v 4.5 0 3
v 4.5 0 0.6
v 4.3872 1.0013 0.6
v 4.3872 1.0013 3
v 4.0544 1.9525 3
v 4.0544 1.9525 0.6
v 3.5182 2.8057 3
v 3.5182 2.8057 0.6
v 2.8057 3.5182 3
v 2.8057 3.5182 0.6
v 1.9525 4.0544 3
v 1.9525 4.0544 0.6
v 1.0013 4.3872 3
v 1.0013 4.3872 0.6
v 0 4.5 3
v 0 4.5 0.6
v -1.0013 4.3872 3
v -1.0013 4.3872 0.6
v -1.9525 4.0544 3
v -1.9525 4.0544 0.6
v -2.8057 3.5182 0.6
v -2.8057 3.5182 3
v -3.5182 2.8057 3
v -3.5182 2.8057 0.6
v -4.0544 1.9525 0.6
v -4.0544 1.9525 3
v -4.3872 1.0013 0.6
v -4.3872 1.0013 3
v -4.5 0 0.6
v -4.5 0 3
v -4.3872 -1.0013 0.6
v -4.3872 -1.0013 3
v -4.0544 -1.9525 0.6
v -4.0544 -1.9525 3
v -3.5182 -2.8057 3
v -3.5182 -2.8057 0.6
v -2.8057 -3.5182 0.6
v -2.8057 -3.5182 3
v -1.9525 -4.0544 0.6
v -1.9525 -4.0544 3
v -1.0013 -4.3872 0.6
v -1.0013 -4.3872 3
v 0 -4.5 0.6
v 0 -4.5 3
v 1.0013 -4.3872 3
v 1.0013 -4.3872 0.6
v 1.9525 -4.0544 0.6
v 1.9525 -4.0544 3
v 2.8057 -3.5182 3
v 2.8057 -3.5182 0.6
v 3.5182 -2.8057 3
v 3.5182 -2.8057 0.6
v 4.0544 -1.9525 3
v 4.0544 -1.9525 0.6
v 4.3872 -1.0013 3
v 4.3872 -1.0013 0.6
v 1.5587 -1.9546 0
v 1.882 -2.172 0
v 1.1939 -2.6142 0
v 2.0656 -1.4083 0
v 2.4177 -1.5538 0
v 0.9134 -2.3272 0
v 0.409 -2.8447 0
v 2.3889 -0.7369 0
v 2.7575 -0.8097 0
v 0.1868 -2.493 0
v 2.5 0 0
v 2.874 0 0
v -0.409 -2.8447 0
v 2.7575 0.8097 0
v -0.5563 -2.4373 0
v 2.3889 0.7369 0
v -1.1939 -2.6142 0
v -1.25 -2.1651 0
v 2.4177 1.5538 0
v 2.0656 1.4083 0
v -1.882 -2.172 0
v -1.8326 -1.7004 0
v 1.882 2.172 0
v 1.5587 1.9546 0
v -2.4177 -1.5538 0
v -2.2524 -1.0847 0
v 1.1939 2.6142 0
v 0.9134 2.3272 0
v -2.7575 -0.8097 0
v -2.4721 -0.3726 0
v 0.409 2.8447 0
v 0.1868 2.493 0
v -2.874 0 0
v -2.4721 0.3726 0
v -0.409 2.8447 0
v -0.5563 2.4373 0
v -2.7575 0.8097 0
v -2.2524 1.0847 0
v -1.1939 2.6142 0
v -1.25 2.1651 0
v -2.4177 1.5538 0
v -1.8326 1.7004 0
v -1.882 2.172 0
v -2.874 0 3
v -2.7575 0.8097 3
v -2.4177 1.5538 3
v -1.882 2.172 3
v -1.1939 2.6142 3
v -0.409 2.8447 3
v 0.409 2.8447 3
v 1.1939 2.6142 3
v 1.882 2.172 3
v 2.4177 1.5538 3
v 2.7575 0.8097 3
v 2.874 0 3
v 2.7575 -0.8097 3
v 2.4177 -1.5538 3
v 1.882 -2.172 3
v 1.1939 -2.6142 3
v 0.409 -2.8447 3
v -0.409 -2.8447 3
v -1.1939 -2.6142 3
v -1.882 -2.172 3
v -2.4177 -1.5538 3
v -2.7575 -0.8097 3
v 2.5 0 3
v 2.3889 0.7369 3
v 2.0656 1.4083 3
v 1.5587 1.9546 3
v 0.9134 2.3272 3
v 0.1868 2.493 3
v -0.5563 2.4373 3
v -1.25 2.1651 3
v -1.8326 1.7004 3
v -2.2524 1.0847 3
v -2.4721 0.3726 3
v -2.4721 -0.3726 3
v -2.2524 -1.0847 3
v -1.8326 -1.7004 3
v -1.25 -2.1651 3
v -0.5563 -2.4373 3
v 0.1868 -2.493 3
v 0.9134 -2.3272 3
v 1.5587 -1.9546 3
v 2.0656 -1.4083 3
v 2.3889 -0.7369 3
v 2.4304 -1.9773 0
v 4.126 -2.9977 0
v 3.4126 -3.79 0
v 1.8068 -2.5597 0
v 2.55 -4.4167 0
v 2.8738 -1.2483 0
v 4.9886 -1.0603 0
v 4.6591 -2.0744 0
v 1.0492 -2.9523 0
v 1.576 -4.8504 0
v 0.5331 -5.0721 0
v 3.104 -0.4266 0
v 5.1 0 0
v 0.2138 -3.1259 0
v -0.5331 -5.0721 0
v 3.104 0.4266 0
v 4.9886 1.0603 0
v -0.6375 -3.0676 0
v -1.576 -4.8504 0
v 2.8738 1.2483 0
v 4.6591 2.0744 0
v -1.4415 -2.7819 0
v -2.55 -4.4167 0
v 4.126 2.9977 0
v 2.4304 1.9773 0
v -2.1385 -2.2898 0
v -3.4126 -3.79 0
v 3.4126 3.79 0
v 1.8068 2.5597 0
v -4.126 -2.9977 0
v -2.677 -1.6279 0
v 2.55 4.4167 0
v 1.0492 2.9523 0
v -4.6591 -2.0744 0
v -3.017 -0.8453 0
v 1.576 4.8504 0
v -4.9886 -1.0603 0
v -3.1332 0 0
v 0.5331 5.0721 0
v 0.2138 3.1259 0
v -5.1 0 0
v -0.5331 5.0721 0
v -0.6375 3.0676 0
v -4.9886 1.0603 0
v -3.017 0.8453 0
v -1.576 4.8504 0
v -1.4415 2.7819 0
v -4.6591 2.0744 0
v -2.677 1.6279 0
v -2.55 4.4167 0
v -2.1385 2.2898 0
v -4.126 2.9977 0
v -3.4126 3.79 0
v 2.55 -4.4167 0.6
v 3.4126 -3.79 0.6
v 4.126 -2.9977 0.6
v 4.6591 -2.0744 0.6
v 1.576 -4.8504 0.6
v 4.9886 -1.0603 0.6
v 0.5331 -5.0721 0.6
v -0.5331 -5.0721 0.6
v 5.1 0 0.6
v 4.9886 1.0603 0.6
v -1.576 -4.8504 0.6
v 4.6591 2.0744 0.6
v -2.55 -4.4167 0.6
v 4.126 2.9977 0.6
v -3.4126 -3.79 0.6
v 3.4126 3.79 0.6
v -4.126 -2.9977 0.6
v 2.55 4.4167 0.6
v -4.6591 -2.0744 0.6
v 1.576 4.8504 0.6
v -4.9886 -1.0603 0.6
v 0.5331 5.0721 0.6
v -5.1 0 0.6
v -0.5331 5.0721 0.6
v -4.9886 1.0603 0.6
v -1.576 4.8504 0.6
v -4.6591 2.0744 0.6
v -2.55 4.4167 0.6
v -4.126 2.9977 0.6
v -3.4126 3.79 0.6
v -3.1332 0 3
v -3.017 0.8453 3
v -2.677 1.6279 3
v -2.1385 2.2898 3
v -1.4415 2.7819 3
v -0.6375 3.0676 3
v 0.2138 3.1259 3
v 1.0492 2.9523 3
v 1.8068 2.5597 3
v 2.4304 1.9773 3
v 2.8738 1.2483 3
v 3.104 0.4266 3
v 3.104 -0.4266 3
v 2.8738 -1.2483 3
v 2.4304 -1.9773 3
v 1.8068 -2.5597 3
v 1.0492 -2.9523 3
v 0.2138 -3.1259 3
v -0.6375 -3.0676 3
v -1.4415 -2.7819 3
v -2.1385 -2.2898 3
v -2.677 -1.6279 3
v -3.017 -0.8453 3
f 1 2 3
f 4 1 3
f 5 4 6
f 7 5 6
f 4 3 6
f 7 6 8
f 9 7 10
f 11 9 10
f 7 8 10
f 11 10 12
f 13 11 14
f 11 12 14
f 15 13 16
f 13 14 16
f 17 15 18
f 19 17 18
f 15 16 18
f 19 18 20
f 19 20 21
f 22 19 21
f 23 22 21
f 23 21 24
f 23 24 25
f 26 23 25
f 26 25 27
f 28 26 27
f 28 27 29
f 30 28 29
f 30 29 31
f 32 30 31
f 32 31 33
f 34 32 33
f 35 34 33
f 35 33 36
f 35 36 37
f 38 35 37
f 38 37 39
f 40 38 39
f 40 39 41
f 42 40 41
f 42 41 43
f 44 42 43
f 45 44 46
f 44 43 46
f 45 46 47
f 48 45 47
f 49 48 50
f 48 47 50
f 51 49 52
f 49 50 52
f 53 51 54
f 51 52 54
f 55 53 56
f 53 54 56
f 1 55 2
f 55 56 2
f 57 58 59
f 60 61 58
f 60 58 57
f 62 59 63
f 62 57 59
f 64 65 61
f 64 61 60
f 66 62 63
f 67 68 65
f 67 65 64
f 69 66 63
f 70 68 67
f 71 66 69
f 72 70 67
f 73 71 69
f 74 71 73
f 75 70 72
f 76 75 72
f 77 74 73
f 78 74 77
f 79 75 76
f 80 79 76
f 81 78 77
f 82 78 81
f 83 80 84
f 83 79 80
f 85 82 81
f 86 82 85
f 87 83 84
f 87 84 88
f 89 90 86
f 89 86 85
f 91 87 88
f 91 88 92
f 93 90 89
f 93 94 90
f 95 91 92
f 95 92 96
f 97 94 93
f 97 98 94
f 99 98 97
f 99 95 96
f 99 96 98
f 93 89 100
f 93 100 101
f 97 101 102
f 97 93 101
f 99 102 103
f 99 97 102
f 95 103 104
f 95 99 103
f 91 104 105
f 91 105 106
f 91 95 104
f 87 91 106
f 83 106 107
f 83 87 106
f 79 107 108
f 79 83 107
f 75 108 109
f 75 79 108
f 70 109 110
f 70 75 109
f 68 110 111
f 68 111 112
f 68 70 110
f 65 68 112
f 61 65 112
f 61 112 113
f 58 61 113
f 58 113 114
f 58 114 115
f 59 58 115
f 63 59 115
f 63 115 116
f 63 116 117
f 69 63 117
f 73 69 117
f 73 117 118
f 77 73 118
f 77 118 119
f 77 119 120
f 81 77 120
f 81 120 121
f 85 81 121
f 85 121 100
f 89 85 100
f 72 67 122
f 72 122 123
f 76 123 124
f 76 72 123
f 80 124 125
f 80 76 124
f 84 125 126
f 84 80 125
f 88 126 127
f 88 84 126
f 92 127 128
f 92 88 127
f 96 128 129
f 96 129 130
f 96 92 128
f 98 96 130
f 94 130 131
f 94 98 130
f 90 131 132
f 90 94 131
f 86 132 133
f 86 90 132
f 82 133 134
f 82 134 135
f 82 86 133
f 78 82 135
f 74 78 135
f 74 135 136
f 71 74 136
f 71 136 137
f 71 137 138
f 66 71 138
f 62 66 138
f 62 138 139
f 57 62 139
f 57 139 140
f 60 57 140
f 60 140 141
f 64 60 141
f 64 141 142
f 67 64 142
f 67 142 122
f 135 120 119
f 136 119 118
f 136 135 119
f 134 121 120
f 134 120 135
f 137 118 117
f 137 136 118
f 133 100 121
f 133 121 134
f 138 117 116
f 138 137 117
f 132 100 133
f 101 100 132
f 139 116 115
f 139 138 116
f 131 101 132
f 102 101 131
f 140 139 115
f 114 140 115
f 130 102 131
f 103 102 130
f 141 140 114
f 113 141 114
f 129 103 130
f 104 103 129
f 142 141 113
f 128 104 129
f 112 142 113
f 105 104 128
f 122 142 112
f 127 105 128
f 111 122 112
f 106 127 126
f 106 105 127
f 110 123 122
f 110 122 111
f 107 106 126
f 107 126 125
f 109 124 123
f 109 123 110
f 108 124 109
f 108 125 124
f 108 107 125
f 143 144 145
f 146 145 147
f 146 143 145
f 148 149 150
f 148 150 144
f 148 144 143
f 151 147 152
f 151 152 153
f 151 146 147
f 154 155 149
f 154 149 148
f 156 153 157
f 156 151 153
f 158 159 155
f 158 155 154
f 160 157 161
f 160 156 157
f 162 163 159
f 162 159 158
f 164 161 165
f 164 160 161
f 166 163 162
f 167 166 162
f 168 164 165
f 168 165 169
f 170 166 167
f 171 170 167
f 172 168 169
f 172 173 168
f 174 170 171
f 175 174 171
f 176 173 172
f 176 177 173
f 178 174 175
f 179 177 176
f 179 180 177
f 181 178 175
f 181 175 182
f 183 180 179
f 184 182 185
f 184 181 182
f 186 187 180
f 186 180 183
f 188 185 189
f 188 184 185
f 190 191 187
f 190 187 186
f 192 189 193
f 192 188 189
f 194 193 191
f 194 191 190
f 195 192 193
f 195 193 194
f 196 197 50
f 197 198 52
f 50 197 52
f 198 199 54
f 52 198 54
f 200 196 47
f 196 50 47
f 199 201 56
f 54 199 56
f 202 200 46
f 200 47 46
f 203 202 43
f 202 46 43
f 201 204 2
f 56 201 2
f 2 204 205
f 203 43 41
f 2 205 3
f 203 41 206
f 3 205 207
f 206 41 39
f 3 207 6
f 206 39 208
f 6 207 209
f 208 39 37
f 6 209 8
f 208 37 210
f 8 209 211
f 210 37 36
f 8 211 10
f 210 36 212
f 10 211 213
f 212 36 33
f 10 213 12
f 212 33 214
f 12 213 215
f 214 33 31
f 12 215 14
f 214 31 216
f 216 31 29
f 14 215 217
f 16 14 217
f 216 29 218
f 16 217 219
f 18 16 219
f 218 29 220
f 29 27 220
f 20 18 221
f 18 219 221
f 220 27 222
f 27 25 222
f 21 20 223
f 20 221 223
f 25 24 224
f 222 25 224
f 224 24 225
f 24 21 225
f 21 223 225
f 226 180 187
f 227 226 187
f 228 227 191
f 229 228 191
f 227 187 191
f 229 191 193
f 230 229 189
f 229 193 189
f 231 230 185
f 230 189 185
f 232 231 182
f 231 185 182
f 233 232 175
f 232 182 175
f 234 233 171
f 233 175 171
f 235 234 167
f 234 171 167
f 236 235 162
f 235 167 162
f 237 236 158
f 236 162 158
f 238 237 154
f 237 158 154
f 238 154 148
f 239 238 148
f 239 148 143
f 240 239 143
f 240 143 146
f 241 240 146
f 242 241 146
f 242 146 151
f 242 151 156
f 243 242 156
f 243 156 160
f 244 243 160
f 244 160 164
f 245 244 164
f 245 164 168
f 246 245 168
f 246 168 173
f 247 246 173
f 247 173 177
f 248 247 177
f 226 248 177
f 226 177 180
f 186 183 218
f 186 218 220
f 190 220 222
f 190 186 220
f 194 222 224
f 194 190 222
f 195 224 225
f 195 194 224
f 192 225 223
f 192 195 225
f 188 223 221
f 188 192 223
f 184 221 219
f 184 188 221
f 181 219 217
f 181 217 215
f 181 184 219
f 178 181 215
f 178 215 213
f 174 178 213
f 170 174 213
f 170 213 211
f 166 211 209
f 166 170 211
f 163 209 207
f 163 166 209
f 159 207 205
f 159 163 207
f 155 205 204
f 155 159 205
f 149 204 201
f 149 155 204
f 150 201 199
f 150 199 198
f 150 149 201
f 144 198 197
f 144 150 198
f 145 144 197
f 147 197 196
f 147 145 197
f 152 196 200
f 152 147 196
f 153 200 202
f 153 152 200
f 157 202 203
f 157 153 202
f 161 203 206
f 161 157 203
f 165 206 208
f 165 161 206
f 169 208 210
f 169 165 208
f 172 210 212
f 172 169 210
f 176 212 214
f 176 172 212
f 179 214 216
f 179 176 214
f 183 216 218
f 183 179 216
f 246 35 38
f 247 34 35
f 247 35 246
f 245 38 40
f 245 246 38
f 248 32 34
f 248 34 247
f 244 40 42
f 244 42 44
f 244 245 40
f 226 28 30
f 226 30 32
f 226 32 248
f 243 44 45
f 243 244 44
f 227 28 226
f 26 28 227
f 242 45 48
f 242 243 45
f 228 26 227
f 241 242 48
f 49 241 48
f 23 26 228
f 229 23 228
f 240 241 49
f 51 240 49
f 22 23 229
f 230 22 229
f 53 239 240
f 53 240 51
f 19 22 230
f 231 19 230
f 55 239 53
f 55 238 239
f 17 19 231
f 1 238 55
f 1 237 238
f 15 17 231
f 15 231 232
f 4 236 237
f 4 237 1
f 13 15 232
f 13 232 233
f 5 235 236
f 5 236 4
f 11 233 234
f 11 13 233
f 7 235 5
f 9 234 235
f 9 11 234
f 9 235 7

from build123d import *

# Parameters (mm, degrees)
SKETCH1_R           = 4.5
SKETCH1_R_2         = 2.5
BOSS_EXTRUDE1_DEPTH = 3
SKETCH2_R           = 5.1
SKETCH2_R_2         = 2.5
BOSS_EXTRUDE2_DEPTH = 0.6
SKETCH3_R           = 3.133161095
SKETCH3_R_2         = 2.873951896
CUT_EXTRUDE1_DEPTH  = 6.6


with BuildPart() as part:
    # Sketch1 → Boss-Extrude1 (new body)
    with BuildSketch(Plane.XY):
        Circle(SKETCH1_R)
        Circle(SKETCH1_R_2, mode=Mode.SUBTRACT)
    extrude(amount=BOSS_EXTRUDE1_DEPTH)

    # Sketch2 → Boss-Extrude2 (add)
    with BuildSketch(Plane(origin=(0, 0, 0), x_dir=(-1, 0, 0), z_dir=(0, 0, -1))):
        Circle(SKETCH2_R)
        with Locations(Location((0, 0, 0), (0, 0, 180))):
            Circle(SKETCH2_R_2, mode=Mode.SUBTRACT)
    extrude(amount=-BOSS_EXTRUDE2_DEPTH)

    # Sketch3 → Cut-Extrude1 (cut)
    with BuildSketch(Plane(origin=(0, 0, 0), x_dir=(-1, 0, 0), z_dir=(0, 0, -1))):
        Circle(SKETCH3_R)
        Circle(SKETCH3_R_2, mode=Mode.SUBTRACT)
    extrude(amount=-CUT_EXTRUDE1_DEPTH, mode=Mode.SUBTRACT)


with BuildPart() as cut_extrude1_piece_1:
    # of the separate pieces the step leaves, piece 1, a body of its own (cut_extrude1_pieces)
    add(part.part.solids().sort_by_distance((-5.1, 0, 0))[0])


with BuildPart() as cut_extrude1_piece_2:
    # of the separate pieces the step leaves, piece 2, a body of its own (cut_extrude1_pieces)
    add(part.part.solids().sort_by_distance((-2.873951896, 0, 0))[0])


solid = Compound([cut_extrude1_piece_1.part, cut_extrude1_piece_2.part])
